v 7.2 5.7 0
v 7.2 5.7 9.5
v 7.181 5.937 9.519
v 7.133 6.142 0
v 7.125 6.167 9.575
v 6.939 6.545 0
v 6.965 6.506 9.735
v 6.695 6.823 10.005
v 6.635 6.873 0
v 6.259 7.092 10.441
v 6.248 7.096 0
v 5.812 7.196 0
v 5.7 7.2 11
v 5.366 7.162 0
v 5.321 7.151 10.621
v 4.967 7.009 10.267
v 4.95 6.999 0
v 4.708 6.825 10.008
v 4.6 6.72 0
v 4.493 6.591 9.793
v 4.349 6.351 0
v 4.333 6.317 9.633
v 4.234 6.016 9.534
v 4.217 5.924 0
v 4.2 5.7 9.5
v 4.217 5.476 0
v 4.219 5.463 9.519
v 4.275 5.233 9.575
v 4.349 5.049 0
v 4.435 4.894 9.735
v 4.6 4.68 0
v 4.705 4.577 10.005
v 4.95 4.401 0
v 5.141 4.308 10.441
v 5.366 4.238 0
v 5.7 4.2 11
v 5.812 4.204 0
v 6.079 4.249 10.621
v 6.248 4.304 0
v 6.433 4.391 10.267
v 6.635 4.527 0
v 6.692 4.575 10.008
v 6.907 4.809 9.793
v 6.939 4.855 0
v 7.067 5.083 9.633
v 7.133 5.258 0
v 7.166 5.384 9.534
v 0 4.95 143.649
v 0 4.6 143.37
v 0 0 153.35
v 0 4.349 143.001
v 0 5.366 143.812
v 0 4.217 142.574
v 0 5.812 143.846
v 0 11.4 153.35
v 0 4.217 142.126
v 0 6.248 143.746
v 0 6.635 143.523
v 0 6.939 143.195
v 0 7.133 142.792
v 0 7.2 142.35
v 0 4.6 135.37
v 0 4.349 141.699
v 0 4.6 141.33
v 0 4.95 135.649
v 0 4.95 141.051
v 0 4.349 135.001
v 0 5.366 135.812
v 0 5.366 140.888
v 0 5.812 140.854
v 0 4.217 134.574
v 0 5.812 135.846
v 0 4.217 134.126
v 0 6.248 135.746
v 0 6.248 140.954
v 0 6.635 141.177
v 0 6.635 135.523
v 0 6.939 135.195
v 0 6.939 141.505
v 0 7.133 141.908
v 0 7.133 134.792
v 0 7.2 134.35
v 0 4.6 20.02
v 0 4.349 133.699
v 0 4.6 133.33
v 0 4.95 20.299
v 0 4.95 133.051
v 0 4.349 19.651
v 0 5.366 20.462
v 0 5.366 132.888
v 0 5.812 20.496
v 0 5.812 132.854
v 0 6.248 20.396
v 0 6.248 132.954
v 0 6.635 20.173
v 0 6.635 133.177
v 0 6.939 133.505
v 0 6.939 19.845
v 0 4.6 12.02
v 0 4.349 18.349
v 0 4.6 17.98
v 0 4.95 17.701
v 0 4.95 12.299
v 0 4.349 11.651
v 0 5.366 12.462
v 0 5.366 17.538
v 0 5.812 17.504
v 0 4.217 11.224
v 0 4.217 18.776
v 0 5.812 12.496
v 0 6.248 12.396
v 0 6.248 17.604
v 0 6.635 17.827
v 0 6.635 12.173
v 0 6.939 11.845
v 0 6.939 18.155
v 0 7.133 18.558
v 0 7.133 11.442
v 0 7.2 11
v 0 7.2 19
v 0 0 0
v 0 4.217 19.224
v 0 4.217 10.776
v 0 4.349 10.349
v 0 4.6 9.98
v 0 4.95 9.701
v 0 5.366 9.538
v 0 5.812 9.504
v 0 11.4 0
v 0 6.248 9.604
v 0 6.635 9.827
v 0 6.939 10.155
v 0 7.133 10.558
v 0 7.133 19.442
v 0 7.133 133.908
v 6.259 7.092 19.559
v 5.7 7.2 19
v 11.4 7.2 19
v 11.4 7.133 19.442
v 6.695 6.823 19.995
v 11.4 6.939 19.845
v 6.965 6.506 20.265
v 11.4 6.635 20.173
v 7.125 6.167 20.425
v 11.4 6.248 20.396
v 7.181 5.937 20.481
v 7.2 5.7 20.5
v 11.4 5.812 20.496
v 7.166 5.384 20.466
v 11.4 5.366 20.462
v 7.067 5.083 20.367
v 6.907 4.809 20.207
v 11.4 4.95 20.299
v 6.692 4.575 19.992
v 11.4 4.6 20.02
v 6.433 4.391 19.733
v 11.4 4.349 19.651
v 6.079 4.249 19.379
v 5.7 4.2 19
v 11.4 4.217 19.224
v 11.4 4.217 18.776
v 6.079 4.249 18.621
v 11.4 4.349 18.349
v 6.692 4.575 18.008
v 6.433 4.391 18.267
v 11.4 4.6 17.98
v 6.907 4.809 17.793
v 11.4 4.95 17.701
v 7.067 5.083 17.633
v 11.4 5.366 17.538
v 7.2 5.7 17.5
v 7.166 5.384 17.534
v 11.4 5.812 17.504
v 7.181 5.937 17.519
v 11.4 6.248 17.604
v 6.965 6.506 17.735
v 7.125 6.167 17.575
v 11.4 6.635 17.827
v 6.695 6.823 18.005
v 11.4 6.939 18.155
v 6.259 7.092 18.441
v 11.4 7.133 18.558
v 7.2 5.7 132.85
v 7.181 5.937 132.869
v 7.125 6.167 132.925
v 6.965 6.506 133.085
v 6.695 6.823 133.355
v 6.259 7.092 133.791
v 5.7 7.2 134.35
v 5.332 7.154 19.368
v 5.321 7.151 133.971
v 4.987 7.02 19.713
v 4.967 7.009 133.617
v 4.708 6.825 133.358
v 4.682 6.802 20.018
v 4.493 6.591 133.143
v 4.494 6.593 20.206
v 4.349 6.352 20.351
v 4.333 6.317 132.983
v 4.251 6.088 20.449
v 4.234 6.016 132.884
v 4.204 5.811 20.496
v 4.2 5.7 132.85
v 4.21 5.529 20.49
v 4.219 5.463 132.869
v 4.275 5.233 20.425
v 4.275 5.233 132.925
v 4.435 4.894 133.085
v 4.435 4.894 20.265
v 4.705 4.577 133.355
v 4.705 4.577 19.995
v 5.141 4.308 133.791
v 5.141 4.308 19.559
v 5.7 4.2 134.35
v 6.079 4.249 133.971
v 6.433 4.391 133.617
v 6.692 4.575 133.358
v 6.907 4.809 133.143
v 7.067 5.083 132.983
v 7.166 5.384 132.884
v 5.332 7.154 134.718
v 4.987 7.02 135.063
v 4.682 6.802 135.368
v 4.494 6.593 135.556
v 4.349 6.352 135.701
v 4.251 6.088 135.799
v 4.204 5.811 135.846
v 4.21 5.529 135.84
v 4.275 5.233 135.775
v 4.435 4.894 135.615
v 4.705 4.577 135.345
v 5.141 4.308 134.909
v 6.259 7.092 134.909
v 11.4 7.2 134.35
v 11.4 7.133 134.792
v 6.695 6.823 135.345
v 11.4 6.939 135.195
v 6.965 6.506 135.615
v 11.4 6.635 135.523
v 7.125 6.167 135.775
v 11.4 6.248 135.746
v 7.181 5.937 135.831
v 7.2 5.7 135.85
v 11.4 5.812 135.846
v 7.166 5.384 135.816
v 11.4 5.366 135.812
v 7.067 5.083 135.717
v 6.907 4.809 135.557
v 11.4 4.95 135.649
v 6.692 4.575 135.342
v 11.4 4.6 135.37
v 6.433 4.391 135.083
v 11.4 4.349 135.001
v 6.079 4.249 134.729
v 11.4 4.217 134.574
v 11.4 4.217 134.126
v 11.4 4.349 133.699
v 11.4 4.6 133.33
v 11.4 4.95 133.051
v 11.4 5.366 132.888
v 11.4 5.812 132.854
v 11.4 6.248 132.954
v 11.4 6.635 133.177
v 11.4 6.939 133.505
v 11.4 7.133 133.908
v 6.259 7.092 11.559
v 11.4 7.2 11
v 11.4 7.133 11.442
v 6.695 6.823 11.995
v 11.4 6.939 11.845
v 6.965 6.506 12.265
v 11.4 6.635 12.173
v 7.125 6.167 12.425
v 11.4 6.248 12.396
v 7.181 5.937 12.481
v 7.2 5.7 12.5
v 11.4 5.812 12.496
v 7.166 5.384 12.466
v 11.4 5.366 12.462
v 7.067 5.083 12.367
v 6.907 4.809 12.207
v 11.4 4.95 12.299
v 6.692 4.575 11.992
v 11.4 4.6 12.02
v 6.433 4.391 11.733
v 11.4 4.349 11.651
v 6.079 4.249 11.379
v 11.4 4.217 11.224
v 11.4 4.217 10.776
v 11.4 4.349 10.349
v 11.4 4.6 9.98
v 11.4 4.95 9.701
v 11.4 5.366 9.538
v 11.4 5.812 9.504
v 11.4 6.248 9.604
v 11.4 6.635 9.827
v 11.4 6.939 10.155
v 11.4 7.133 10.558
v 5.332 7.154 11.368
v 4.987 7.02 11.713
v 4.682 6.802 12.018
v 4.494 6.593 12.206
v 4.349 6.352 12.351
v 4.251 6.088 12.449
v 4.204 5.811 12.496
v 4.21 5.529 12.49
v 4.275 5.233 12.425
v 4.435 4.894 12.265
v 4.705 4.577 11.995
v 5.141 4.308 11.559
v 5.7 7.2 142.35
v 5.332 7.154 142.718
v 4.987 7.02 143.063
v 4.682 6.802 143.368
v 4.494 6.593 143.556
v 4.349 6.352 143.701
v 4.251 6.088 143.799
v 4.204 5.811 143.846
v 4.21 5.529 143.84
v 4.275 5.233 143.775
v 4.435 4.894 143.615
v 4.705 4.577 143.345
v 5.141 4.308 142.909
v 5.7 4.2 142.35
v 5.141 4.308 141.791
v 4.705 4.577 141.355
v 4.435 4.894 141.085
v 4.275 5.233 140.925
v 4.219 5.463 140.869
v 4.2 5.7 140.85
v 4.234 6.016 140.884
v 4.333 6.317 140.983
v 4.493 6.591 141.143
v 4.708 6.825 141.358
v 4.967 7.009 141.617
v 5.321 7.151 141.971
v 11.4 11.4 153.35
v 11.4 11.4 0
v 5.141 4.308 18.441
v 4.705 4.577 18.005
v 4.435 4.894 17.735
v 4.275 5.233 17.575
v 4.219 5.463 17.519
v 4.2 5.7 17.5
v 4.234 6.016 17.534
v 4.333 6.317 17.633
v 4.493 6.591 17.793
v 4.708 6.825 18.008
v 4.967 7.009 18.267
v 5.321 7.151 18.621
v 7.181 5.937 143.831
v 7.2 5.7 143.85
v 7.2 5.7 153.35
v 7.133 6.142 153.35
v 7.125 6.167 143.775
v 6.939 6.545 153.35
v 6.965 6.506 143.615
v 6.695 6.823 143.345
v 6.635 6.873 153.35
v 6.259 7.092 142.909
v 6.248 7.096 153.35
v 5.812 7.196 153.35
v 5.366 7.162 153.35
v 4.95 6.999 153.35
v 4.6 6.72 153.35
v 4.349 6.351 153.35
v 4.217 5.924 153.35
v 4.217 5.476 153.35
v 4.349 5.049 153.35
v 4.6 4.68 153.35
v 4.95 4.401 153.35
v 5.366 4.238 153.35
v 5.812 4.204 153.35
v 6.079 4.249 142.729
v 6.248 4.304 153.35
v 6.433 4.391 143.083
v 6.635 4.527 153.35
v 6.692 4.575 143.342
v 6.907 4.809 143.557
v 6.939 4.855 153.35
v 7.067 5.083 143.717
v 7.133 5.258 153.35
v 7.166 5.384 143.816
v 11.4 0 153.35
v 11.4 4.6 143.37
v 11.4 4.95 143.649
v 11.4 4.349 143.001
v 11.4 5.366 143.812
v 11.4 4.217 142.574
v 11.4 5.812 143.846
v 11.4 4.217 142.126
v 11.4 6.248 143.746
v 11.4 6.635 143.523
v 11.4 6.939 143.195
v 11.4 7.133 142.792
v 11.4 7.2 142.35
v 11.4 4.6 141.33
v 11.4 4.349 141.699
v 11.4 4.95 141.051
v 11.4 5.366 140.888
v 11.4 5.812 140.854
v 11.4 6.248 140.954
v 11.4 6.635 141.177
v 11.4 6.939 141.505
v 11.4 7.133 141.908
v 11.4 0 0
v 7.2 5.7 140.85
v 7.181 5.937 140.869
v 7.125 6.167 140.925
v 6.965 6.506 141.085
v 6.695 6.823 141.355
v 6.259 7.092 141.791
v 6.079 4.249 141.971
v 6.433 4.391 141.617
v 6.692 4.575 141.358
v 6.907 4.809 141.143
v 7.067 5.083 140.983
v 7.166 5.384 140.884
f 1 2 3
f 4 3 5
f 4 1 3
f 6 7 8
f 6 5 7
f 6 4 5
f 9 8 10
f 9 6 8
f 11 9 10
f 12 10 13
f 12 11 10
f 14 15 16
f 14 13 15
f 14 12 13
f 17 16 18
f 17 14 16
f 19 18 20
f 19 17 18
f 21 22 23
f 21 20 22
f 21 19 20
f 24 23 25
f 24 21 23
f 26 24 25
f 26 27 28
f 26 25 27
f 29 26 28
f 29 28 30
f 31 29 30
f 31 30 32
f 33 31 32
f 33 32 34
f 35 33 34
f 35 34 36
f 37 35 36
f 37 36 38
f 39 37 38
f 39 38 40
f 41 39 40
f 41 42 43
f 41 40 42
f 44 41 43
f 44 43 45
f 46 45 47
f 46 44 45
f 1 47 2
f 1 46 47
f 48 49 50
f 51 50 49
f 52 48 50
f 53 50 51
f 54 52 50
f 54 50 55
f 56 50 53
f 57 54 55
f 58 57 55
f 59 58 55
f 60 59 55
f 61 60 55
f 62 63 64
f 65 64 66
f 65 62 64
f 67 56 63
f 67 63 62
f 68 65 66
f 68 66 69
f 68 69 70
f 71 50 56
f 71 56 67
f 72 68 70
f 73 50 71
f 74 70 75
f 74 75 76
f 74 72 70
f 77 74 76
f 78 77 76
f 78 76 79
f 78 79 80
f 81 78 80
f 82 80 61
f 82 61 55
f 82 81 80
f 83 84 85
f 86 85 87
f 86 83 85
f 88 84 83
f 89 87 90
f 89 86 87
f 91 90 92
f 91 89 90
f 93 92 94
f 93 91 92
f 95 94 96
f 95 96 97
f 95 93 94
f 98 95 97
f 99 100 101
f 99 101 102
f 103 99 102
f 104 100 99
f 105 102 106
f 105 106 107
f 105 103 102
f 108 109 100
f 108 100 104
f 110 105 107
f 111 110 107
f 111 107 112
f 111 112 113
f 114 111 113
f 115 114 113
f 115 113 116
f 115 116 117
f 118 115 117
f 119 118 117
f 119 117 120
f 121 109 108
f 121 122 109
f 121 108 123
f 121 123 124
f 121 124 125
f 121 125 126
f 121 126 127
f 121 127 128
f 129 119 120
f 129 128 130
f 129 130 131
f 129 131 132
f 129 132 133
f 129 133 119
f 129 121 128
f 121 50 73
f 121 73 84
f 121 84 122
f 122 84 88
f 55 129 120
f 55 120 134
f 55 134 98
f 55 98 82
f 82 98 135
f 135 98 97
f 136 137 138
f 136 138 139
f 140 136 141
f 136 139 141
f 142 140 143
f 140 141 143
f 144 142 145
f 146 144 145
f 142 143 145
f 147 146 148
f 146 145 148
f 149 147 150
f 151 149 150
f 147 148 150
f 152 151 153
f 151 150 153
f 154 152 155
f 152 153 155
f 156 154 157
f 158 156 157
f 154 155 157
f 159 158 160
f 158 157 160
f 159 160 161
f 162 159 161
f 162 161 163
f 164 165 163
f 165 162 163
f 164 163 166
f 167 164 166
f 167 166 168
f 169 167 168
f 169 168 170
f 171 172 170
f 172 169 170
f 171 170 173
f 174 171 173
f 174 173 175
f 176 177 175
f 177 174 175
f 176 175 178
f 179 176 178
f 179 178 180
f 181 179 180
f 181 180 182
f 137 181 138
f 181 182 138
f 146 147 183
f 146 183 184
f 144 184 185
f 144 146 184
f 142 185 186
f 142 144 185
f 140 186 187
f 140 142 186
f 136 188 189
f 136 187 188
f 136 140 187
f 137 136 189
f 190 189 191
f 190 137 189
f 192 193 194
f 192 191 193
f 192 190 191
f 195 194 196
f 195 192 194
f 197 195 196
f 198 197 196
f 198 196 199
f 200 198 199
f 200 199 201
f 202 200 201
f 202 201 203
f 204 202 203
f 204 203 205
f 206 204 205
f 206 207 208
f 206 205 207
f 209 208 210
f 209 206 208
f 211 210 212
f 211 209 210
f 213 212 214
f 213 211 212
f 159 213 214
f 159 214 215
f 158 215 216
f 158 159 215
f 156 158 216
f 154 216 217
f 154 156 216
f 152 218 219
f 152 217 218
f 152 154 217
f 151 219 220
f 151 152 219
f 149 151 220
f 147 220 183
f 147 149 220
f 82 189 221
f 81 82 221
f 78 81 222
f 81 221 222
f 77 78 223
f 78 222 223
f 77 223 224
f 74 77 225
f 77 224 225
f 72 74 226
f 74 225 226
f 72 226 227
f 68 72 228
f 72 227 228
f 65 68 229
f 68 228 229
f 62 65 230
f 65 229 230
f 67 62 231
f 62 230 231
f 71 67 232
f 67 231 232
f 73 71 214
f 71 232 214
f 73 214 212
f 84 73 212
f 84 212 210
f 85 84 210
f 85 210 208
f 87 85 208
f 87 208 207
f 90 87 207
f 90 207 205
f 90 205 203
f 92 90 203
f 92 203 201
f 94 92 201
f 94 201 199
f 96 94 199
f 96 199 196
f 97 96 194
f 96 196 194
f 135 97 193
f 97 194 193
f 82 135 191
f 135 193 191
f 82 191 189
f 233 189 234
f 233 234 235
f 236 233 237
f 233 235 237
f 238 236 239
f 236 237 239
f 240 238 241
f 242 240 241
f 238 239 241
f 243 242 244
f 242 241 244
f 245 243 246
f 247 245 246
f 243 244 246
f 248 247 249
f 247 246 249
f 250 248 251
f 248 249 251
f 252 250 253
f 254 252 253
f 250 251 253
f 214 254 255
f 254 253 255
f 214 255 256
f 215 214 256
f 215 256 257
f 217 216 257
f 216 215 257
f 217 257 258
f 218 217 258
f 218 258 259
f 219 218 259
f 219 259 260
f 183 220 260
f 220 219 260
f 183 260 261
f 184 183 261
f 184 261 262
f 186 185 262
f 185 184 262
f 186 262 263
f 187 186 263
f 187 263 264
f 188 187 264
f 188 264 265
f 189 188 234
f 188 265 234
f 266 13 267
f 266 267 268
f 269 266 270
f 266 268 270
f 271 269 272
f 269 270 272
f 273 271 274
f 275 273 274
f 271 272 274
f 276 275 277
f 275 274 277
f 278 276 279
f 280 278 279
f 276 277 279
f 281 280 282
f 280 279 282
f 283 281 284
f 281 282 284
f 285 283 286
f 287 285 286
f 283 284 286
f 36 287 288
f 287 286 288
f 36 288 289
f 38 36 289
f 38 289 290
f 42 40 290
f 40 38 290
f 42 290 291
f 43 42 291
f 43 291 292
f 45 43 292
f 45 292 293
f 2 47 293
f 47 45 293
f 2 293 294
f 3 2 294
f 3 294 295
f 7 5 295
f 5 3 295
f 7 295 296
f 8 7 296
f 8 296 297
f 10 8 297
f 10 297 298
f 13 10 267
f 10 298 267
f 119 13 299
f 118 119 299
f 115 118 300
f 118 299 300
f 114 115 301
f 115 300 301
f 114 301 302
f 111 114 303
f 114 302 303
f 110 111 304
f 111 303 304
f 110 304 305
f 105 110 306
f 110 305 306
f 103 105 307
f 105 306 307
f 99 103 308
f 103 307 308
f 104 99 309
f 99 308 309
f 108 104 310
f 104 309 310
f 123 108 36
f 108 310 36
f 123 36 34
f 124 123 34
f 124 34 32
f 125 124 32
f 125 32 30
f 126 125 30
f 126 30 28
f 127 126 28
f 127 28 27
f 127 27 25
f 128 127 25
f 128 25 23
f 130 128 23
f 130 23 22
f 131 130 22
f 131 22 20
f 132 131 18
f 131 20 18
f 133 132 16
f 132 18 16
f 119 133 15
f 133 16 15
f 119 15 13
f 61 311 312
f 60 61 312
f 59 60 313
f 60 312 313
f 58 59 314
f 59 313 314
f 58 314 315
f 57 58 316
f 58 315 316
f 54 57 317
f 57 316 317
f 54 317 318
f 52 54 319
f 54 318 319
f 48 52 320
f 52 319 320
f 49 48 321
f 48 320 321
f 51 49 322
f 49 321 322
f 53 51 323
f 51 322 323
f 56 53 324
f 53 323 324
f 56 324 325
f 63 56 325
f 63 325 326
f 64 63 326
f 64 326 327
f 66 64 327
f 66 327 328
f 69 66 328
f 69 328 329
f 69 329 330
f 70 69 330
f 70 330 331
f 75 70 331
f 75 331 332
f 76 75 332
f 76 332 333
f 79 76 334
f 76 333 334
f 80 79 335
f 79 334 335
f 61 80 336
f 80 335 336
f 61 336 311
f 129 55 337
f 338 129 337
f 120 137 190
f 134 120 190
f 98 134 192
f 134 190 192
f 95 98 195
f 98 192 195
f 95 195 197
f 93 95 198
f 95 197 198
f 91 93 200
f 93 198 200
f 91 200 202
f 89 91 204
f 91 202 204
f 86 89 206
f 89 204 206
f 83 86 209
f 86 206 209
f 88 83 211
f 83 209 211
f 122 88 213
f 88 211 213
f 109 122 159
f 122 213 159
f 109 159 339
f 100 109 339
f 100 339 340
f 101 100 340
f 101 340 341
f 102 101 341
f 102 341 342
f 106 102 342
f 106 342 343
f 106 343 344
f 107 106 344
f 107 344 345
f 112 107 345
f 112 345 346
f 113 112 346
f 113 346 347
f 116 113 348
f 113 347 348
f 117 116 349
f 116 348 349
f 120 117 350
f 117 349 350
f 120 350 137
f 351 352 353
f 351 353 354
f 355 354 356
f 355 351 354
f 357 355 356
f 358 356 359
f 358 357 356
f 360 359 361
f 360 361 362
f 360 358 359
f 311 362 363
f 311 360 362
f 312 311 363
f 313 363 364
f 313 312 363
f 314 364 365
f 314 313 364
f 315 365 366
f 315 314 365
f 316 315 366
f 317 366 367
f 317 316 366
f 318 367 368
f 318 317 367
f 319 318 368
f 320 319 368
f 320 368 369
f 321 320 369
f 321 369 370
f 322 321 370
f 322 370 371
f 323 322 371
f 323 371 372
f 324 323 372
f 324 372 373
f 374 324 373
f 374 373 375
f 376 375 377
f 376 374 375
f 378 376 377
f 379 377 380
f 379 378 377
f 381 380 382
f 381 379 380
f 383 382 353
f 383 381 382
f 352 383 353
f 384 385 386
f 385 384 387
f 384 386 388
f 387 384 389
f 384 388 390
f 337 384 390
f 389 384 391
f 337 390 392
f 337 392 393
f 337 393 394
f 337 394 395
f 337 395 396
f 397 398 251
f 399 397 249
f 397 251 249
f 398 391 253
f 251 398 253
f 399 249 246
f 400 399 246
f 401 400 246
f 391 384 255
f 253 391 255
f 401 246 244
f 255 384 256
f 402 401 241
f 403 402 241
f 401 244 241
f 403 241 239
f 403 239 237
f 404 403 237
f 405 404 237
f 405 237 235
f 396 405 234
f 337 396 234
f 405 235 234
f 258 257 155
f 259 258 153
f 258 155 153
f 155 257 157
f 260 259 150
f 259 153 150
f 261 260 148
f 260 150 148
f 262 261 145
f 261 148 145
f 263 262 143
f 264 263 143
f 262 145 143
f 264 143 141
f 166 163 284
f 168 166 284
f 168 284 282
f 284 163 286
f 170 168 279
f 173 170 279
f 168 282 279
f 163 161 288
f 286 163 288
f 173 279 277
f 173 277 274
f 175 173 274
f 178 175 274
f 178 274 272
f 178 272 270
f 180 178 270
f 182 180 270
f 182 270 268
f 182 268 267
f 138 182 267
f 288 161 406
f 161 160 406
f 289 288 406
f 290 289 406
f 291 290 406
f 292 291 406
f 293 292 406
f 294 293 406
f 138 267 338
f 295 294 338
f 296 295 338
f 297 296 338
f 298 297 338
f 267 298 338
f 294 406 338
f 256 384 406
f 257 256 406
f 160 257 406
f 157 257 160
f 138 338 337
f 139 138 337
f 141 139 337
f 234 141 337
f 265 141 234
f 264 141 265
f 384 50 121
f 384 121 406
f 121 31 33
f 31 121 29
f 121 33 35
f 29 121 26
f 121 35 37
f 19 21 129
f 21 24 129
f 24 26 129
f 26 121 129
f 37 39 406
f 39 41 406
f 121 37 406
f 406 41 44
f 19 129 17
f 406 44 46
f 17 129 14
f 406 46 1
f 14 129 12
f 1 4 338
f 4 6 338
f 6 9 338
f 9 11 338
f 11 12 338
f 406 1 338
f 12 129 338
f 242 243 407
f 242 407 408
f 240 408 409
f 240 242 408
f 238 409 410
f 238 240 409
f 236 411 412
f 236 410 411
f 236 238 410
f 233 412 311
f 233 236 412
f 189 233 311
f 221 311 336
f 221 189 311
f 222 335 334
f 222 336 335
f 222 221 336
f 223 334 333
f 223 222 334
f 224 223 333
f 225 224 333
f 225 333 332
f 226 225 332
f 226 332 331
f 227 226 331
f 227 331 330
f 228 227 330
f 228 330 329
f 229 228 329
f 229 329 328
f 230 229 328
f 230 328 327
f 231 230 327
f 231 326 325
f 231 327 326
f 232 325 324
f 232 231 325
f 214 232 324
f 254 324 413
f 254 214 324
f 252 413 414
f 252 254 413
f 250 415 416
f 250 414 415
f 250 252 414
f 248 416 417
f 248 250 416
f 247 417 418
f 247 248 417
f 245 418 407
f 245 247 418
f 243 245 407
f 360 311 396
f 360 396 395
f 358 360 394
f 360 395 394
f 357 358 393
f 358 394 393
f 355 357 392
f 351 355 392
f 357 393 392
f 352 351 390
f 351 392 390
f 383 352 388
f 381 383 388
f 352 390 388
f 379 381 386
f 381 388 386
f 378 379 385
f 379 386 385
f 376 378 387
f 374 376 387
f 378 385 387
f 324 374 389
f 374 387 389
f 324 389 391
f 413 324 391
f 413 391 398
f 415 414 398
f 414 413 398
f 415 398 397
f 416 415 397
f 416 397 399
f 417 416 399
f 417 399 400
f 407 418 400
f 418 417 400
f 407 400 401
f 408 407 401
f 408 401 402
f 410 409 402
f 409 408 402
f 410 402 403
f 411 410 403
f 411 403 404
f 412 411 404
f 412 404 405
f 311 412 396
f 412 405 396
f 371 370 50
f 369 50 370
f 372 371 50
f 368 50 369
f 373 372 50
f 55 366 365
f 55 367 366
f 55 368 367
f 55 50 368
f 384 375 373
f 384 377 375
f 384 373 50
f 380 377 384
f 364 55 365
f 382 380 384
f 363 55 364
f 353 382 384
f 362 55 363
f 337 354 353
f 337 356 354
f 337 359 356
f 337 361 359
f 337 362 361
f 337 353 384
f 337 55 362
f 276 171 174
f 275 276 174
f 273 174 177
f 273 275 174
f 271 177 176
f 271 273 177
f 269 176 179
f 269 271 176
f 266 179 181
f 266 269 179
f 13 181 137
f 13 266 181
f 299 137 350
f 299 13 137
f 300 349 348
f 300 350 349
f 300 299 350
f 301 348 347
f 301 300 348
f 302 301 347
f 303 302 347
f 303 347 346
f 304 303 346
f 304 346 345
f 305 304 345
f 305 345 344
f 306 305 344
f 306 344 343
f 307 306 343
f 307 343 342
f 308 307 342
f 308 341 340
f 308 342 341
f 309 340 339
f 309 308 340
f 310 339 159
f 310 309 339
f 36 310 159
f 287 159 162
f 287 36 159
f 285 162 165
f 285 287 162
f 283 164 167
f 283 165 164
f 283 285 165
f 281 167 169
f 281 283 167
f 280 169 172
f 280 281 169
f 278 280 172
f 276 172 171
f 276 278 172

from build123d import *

# Parameters (mm, degrees)
SKETCH_W     = 11.4
SKETCH_H     = 11.4
SKETCH_R     = 1.5
PAD_DEPTH    = 153.35
SKETCH001_R  = 1.5
POCKET_DEPTH = 11.401


with BuildPart() as part:
    # Sketch → Pad (new body)
    with BuildSketch(Plane.XY):
        with Locations((5.7, 5.7)):
            Rectangle(SKETCH_W, SKETCH_H)
        with Locations((5.7, 5.7)):
            Circle(SKETCH_R, mode=Mode.SUBTRACT)
    extrude(amount=PAD_DEPTH)

    # Sketch001 → Pocket (cut, through all)
    with BuildSketch(Plane.YZ.offset(11.4)):
        with Locations((5.7, 142.35)):
            Circle(SKETCH001_R)
        with Locations((5.7, 134.35)):
            Circle(SKETCH001_R)
        with Locations((5.7, 19)):
            Circle(SKETCH001_R)
        with Locations((5.7, 11)):
            Circle(SKETCH001_R)
    extrude(amount=-POCKET_DEPTH, mode=Mode.SUBTRACT)


solid = part.part
